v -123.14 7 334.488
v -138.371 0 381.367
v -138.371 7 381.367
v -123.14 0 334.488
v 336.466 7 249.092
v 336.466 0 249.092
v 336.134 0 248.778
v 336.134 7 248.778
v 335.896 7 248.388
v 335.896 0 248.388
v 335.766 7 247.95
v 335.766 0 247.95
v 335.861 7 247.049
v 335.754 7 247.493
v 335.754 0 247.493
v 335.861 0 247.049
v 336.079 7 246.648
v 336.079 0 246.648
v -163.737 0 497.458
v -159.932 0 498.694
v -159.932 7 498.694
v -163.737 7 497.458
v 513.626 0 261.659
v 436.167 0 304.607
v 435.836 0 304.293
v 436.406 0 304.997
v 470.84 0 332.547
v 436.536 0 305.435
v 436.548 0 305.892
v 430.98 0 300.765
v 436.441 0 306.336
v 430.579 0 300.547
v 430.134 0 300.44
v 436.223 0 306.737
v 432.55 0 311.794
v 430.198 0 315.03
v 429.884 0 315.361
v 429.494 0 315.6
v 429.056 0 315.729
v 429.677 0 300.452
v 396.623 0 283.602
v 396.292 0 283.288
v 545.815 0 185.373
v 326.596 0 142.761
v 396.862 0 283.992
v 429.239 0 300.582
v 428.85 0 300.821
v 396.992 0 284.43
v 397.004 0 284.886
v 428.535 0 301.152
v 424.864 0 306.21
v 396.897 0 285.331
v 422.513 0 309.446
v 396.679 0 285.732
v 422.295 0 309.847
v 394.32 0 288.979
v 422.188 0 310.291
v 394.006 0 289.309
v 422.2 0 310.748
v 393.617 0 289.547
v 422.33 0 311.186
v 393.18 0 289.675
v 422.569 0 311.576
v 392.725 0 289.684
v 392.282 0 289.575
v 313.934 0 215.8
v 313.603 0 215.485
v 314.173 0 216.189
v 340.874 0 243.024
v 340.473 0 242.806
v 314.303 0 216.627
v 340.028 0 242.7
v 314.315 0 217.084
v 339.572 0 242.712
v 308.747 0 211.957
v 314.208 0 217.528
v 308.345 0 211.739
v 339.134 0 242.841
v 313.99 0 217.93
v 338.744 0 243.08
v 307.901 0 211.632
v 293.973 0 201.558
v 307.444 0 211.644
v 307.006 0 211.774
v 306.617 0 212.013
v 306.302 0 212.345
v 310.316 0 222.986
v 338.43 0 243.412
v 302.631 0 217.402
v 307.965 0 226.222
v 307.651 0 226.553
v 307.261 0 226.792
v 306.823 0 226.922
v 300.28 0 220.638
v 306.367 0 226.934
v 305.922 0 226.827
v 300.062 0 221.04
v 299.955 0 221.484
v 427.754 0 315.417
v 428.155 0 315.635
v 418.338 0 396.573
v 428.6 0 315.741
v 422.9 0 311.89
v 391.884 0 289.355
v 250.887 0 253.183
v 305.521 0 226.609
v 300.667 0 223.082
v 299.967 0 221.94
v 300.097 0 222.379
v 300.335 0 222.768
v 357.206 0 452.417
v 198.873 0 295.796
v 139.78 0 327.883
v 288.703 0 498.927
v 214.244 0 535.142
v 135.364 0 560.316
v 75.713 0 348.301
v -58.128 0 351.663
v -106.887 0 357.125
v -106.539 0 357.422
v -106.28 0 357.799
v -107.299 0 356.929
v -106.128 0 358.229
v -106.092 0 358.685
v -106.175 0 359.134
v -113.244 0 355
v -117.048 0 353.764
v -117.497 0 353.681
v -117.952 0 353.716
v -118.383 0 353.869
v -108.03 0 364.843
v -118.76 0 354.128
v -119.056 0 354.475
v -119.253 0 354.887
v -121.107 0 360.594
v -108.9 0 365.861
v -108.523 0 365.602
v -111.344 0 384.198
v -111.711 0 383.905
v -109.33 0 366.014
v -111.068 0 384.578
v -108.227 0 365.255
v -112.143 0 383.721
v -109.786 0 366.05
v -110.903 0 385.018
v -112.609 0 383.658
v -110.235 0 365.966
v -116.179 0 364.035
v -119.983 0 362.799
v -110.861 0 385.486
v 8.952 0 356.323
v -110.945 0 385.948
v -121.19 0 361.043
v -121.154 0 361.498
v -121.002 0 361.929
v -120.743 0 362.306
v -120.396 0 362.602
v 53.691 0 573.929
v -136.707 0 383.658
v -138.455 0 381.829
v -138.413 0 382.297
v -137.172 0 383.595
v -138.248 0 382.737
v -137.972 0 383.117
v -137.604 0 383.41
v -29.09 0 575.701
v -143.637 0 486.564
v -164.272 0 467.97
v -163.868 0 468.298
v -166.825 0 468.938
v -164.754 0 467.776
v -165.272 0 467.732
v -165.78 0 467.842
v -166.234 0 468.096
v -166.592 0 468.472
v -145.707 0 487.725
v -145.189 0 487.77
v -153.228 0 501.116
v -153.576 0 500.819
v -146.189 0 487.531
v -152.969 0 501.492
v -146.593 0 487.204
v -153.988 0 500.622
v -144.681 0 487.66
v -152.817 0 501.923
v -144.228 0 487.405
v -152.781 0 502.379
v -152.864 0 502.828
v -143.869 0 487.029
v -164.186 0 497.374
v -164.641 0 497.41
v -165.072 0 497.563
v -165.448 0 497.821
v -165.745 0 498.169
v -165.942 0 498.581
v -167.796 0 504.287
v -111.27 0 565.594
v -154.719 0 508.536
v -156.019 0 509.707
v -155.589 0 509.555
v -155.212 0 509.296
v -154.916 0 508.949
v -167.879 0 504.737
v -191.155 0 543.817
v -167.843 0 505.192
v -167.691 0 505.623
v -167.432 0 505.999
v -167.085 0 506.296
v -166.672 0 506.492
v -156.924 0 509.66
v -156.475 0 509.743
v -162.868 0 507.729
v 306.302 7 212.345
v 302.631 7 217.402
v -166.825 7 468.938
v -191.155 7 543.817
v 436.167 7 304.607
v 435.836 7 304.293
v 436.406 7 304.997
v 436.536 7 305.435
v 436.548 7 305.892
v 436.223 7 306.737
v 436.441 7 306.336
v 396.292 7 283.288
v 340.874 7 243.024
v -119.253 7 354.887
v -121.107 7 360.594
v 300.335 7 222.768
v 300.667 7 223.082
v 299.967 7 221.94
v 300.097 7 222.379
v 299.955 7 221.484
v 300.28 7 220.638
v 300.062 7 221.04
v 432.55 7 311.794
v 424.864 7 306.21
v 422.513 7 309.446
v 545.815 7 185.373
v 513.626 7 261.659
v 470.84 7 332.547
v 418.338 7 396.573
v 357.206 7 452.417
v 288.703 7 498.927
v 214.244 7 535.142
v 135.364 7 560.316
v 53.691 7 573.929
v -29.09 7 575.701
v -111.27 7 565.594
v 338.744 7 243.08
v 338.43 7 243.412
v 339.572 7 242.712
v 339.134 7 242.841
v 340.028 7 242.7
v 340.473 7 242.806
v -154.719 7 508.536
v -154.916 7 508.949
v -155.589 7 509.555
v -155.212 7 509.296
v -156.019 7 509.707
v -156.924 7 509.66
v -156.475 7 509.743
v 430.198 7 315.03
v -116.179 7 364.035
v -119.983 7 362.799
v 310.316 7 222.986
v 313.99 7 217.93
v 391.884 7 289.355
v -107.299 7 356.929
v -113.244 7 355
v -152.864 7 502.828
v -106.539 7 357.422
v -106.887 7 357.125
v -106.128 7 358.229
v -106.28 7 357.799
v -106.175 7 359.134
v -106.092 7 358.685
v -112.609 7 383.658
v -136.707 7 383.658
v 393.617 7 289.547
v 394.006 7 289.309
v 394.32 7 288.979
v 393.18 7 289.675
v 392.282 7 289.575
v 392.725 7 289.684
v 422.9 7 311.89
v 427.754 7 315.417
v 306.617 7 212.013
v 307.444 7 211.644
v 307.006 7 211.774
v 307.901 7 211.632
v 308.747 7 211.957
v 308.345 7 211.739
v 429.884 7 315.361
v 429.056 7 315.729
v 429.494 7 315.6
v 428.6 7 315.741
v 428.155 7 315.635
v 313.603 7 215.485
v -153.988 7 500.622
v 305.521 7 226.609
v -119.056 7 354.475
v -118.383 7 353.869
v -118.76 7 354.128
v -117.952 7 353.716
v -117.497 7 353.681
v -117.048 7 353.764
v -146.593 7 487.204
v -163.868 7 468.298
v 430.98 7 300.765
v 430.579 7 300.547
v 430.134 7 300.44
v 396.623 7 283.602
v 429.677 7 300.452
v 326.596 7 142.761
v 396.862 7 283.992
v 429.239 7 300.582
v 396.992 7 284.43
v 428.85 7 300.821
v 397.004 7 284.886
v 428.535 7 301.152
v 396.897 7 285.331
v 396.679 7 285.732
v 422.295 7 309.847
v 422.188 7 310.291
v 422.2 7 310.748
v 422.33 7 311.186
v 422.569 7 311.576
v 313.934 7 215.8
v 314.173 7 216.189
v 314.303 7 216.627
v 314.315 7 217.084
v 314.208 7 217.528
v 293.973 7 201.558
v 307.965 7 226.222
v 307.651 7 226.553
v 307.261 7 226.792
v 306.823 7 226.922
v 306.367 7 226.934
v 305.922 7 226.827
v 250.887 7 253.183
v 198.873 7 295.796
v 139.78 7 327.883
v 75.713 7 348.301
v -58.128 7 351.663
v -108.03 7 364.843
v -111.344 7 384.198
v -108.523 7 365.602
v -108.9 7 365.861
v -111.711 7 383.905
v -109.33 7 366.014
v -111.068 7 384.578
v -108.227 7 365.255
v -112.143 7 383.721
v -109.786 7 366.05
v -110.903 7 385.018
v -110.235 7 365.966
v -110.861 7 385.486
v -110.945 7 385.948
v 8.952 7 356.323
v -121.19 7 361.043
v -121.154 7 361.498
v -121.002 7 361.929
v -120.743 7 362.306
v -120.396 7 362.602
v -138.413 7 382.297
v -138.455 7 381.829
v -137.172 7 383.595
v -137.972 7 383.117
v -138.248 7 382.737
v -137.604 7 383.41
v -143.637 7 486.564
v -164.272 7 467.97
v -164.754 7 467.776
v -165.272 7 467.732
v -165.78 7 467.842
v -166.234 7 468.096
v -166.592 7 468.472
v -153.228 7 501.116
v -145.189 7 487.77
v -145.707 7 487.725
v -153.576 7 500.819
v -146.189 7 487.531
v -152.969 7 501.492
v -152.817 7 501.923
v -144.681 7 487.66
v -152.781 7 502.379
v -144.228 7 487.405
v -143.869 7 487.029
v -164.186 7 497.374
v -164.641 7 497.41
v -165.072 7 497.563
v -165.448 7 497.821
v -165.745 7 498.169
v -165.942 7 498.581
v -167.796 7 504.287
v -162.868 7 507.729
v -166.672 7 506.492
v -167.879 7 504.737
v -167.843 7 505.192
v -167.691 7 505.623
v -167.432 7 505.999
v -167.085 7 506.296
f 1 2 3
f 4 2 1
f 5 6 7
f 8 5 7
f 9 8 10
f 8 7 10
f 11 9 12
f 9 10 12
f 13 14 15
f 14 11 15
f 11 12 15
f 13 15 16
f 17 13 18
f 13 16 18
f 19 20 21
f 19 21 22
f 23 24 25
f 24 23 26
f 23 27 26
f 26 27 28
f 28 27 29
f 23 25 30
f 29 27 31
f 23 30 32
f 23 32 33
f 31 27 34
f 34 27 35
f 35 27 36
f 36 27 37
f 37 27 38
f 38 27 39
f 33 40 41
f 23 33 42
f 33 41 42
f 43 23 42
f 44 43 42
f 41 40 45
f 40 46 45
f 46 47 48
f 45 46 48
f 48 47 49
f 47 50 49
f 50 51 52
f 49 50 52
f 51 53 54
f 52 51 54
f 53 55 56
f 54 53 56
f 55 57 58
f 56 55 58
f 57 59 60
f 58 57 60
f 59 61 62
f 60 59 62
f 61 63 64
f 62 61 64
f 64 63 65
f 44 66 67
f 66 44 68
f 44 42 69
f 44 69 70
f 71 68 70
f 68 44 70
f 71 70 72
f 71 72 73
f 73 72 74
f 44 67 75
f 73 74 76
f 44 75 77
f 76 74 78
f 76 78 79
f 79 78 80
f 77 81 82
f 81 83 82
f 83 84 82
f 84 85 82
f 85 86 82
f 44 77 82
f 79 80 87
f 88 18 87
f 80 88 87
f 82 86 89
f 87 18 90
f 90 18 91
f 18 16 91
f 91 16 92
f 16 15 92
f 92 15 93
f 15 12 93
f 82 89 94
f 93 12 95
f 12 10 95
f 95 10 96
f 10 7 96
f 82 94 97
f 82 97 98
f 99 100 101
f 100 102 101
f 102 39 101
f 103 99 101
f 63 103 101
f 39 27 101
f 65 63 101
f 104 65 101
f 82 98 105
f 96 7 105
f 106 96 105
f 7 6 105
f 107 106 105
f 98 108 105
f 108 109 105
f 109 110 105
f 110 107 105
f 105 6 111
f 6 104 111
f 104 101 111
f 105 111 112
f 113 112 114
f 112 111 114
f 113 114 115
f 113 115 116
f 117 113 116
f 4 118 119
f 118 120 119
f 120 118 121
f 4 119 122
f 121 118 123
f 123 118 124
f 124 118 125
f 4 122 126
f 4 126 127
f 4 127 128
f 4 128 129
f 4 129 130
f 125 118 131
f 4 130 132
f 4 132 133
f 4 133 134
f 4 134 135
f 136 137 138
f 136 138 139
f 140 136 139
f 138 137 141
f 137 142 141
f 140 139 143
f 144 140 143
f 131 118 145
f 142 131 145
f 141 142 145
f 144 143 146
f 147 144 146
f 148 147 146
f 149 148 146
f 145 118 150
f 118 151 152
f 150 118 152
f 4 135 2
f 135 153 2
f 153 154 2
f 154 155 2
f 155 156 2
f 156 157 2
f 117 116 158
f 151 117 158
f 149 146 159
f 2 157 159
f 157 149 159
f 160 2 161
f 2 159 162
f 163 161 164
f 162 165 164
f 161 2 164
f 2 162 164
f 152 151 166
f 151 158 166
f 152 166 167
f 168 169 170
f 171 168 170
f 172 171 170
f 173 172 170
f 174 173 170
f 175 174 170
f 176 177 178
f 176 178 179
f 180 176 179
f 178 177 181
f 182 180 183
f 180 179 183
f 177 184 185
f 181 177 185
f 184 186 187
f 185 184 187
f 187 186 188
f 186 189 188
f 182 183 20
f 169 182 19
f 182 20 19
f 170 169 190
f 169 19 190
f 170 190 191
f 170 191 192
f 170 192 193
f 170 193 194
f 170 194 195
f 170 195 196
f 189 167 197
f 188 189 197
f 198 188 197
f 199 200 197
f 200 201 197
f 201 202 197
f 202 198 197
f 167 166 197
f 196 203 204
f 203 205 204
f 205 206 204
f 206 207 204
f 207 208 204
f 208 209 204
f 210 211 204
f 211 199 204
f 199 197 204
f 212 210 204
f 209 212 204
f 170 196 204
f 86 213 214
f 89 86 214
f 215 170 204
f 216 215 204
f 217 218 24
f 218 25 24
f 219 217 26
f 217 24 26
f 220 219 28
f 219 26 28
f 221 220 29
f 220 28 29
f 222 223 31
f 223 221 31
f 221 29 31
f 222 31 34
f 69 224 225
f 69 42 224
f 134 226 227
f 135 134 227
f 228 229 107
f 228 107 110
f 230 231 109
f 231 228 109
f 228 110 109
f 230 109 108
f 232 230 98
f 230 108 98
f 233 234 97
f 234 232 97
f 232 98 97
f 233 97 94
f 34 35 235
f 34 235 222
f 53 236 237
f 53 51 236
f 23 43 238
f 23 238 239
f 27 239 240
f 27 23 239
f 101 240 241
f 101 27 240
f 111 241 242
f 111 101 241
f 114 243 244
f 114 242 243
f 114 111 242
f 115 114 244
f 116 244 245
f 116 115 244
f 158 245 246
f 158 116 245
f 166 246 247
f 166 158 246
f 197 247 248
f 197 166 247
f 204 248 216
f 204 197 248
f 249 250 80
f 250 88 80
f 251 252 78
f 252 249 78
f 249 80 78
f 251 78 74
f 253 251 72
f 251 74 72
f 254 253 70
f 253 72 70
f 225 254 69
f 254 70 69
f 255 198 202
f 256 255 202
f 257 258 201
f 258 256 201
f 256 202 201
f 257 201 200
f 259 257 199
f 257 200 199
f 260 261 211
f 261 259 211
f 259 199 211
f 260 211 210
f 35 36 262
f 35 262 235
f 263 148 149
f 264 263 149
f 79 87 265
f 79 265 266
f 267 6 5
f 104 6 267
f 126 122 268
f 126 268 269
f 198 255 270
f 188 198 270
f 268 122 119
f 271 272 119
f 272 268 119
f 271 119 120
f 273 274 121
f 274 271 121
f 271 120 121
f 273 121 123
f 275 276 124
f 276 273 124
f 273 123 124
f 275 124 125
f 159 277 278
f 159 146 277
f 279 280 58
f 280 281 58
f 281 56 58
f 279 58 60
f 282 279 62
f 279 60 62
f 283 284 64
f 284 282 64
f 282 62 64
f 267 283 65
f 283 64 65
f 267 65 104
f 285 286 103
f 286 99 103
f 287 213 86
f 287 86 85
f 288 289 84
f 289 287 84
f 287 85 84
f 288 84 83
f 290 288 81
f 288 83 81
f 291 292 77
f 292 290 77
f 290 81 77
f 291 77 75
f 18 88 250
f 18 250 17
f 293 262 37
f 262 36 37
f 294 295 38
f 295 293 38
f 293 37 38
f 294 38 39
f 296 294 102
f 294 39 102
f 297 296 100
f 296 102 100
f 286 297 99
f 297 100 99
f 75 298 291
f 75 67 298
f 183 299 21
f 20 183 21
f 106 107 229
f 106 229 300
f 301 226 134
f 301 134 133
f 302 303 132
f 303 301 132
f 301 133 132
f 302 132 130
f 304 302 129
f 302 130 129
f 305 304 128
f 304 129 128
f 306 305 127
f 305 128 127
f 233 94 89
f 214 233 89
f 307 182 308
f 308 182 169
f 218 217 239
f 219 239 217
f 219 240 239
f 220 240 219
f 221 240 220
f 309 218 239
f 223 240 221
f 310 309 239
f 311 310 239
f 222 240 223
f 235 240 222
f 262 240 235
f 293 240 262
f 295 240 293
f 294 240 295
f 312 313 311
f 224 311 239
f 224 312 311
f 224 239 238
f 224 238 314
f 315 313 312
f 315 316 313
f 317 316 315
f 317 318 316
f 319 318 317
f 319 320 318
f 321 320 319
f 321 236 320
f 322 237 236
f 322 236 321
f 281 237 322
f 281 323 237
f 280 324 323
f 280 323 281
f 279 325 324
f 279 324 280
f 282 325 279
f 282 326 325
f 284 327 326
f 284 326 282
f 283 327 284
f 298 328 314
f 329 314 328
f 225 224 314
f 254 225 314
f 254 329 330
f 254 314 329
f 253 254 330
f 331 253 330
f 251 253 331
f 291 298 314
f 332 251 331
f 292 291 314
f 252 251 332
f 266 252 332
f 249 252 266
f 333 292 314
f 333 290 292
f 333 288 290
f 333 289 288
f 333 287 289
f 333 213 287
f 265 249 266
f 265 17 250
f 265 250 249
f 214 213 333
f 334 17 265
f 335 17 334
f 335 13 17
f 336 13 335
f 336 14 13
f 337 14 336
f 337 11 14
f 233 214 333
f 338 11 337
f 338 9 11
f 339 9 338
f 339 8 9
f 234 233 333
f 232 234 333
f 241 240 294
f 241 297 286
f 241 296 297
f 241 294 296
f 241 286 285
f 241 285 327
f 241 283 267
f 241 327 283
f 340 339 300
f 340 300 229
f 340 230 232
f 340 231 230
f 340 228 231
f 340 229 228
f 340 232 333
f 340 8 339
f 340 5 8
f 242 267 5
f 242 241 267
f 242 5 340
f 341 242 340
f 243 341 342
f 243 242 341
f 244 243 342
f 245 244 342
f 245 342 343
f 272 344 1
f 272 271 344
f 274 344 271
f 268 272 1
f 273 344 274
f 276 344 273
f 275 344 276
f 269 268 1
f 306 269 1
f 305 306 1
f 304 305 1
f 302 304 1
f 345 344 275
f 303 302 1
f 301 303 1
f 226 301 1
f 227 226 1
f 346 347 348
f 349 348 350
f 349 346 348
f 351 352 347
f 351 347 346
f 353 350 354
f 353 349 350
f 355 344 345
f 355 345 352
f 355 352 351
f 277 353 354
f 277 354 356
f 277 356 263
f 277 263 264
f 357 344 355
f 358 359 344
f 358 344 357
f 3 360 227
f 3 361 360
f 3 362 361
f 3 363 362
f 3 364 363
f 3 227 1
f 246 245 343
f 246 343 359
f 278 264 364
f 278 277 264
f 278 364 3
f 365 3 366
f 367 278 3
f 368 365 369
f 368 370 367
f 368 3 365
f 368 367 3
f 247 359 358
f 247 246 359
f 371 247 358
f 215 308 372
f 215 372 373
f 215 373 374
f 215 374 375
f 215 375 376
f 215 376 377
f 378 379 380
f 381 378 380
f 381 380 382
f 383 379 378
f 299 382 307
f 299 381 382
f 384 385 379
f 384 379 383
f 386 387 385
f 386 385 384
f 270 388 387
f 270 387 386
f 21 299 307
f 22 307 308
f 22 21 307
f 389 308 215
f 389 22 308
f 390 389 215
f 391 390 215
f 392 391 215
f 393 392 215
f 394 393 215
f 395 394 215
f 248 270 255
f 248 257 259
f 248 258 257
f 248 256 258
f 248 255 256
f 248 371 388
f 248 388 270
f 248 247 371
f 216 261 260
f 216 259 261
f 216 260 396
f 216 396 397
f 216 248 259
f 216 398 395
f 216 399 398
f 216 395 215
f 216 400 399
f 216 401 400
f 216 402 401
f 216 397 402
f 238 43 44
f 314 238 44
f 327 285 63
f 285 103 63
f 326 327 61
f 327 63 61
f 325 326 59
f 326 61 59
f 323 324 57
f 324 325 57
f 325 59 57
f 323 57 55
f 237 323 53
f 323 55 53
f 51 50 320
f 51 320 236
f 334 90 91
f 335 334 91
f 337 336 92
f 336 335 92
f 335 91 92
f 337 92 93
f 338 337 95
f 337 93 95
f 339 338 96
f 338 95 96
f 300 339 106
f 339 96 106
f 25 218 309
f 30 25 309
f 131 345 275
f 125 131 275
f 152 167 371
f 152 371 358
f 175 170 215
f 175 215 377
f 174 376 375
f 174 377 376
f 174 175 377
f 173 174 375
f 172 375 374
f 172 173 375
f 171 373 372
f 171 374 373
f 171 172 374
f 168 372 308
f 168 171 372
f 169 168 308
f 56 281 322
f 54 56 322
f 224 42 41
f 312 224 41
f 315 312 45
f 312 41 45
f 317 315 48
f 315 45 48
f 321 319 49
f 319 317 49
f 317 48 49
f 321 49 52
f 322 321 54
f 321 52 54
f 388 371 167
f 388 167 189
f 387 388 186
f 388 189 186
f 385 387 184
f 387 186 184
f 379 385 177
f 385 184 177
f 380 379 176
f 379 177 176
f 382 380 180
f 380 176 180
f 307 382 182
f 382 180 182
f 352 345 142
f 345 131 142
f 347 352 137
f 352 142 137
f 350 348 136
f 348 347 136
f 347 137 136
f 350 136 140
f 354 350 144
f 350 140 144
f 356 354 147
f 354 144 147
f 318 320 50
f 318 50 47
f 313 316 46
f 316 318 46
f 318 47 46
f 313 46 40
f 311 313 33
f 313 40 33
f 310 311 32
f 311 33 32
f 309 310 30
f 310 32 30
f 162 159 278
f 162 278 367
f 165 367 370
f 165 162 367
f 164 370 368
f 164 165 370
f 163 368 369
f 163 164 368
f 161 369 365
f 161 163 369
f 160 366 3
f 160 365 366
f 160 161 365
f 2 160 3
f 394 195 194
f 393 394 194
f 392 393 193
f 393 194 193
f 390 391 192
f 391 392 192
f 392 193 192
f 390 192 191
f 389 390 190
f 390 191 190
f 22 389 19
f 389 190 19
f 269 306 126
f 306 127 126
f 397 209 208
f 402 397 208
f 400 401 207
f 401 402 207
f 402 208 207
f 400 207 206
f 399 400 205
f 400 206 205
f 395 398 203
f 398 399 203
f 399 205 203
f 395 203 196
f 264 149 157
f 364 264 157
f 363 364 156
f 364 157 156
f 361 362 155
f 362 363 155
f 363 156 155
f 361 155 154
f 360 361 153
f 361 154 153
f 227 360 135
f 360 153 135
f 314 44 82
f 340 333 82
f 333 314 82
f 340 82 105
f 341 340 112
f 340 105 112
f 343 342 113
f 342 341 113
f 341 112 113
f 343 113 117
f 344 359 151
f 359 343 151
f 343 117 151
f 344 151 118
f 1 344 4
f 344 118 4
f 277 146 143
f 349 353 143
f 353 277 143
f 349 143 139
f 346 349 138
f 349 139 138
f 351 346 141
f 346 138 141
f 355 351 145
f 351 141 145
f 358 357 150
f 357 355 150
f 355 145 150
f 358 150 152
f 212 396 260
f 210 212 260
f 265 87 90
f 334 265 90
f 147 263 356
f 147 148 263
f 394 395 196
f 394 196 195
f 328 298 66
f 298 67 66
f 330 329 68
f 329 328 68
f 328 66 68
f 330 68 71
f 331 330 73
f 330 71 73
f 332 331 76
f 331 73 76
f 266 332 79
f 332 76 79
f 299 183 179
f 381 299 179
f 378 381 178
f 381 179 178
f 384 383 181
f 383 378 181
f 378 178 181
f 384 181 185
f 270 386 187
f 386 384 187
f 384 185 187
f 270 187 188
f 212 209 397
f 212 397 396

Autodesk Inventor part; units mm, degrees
ref_plane "YZ Plane" through (0, 0, 0) normal (1, 0, 0) x (0, 1, 0)
ref_plane "XZ Plane" through (0, 0, 0) normal (0, 1, 0) x (-1, 0, 0)
ref_plane "XY Plane" through (0, 0, 0) normal (0, 0, 1) x (1, 0, 0)
sketch "Sketch1" plane through (0, 0, 0) normal (0, 1, 0) x (-1, 0, 0)
  line L0 (-545.8153, 185.3726) -> (-326.5965, 142.7608)
  line L1 (-545.8153, -185.3726) -> (-326.5965, -142.7608)
  arc A0 (-545.8153, -185.3726) -> (-545.8153, 185.3726) centre (0, 0) ccw
  arc A1 (374.3691, 3.75) -> (372.6191, 2) centre (374.3691, 2) ccw
  arc A2 (372.6191, -2) -> (374.3691, -3.75) centre (374.3691, -2) ccw
  line L2 (380.3691, 3.75) -> (374.3691, 3.75)
  line L3 (374.3691, -3.75) -> (380.3691, -3.75)
  line L4 (382.1191, 2) -> (382.1191, -2)
  arc A3 (380.3691, -3.75) -> (382.1191, -2) centre (380.3691, -2) ccw
  arc A4 (382.1191, 2) -> (380.3691, 3.75) centre (380.3691, 2) ccw
  line L5 (372.6191, -2) -> (372.6191, 2)
  line L6 (523.7076, 2) -> (523.7076, -2)
  arc A5 (523.7076, -2) -> (525.4576, -3.75) centre (525.4576, -2) ccw
  arc A6 (525.4576, 3.75) -> (523.7076, 2) centre (525.4576, 2) ccw
  line L7 (531.4576, -3.75) -> (525.4576, -3.75)
  line L8 (525.4576, 3.75) -> (531.4576, 3.75)
  arc A7 (531.4576, -3.75) -> (533.2076, -2) centre (531.4576, -2) ccw
  line L9 (533.2076, -2) -> (533.2076, 2)
  arc A8 (533.2076, 2) -> (531.4576, 3.75) centre (531.4576, 2) ccw
  arc A9 (-326.5965, -142.7608) -> (-326.5965, 142.7608) centre (0, 0) ccw
  line L10 (116.1792, 364.0349) -> (119.9834, 362.7989)
  arc A10 (121.107, 360.5937) -> (119.9834, 362.7989) centre (119.4426, 361.1345) ccw
  arc A11 (116.1792, 364.0349) -> (113.9741, 362.9114) centre (115.6384, 362.3706) ccw
  line L11 (119.2529, 354.8874) -> (121.107, 360.5937)
  line L12 (113.9741, 362.9114) -> (112.12, 357.205)
  line L13 (117.0478, 353.7638) -> (113.2435, 354.9999)
  arc A12 (112.12, 357.205) -> (113.2435, 354.9999) centre (113.7843, 356.6642) ccw
  arc A13 (117.0478, 353.7638) -> (119.2529, 354.8874) centre (117.5885, 355.4282) ccw
  arc A14 (163.7367, 497.4575) -> (165.9418, 498.5811) centre (164.2774, 499.1218) ccw
  arc A15 (158.8089, 500.8987) -> (159.9324, 498.6936) centre (160.4732, 500.3579) ccw
  line L14 (159.9324, 498.6936) -> (163.7367, 497.4575)
  line L15 (158.8089, 500.8987) -> (160.663, 506.605)
  line L16 (167.7959, 504.2874) -> (165.9418, 498.5811)
  arc A16 (162.8681, 507.7286) -> (160.663, 506.605) centre (162.3273, 506.0642) ccw
  line L17 (166.6723, 506.4925) -> (162.8681, 507.7286)
  arc A17 (167.7959, 504.2874) -> (166.6723, 506.4925) centre (166.1315, 504.8282) ccw
  line L18 (-310.3164, 222.986) -> (-307.9653, 226.222)
  arc A18 (-305.5209, 226.6092) -> (-307.9653, 226.222) centre (-306.5495, 225.1934) ccw
  arc A19 (-310.3164, 222.986) -> (-309.9293, 220.5416) centre (-308.9007, 221.9573) ccw
  line L19 (-300.6668, 223.0825) -> (-305.5209, 226.6092)
  line L20 (-309.9293, 220.5416) -> (-305.0752, 217.0148)
  line L21 (-300.2796, 220.6381) -> (-302.6308, 217.402)
  arc A20 (-305.0752, 217.0148) -> (-302.6308, 217.402) centre (-304.0466, 218.4306) ccw
  arc A21 (-300.2796, 220.6381) -> (-300.6668, 223.0825) centre (-301.6954, 221.6667) ccw
  arc A22 (-422.5128, 309.4456) -> (-422.8999, 311.89) centre (-423.9286, 310.4743) ccw
  arc A23 (-427.3083, 305.8224) -> (-424.8639, 306.2096) centre (-426.2797, 307.2382) ccw
  line L22 (-424.8639, 306.2096) -> (-422.5128, 309.4456)
  line L23 (-427.3083, 305.8224) -> (-432.1624, 309.3491)
  line L24 (-427.754, 315.4167) -> (-422.8999, 311.89)
  arc A24 (-432.5496, 311.7935) -> (-432.1624, 309.3491) centre (-431.1338, 310.7649) ccw
  line L25 (-430.1984, 315.0296) -> (-432.5496, 311.7935)
  arc A25 (-427.754, 315.4167) -> (-430.1984, 315.0296) centre (-428.7827, 314.001) ccw
  line L26 (-307.9653, -226.222) -> (-310.3164, -222.986)
  arc A26 (-309.9293, -220.5416) -> (-310.3164, -222.986) centre (-308.9007, -221.9573) ccw
  arc A27 (-307.9653, -226.222) -> (-305.5209, -226.6092) centre (-306.5495, -225.1934) ccw
  line L27 (-305.0752, -217.0148) -> (-309.9293, -220.5416)
  line L28 (-305.5209, -226.6092) -> (-300.6668, -223.0825)
  line L29 (-302.6308, -217.402) -> (-300.2796, -220.6381)
  arc A28 (-300.6668, -223.0825) -> (-300.2796, -220.6381) centre (-301.6954, -221.6667) ccw
  arc A29 (-302.6308, -217.402) -> (-305.0752, -217.0148) centre (-304.0466, -218.4306) ccw
  arc A30 (-424.8639, -306.2096) -> (-427.3083, -305.8224) centre (-426.2797, -307.2382) ccw
  arc A31 (-422.8999, -311.89) -> (-422.5128, -309.4456) centre (-423.9286, -310.4743) ccw
  line L30 (-422.5128, -309.4456) -> (-424.8639, -306.2096)
  line L31 (-422.8999, -311.89) -> (-427.754, -315.4167)
  line L32 (-432.1624, -309.3491) -> (-427.3083, -305.8224)
  arc A32 (-430.1984, -315.0296) -> (-427.754, -315.4167) centre (-428.7827, -314.001) ccw
  line L33 (-432.5496, -311.7935) -> (-430.1984, -315.0296)
  arc A33 (-432.1624, -309.3491) -> (-432.5496, -311.7935) centre (-431.1338, -310.7649) ccw
  line L34 (119.9834, -362.7989) -> (116.1792, -364.0349)
  arc A34 (113.9741, -362.9114) -> (116.1792, -364.0349) centre (115.6384, -362.3706) ccw
  arc A35 (119.9834, -362.7989) -> (121.107, -360.5937) centre (119.4426, -361.1345) ccw
  line L35 (112.12, -357.205) -> (113.9741, -362.9114)
  line L36 (121.107, -360.5937) -> (119.2529, -354.8874)
  line L37 (113.2435, -354.9999) -> (117.0478, -353.7638)
  arc A36 (119.2529, -354.8874) -> (117.0478, -353.7638) centre (117.5885, -355.4282) ccw
  arc A37 (113.2435, -354.9999) -> (112.12, -357.205) centre (113.7843, -356.6642) ccw
  arc A38 (159.9324, -498.6936) -> (158.8089, -500.8987) centre (160.4732, -500.3579) ccw
  arc A39 (165.9418, -498.5811) -> (163.7367, -497.4575) centre (164.2774, -499.1218) ccw
  line L38 (163.7367, -497.4575) -> (159.9324, -498.6936)
  line L39 (165.9418, -498.5811) -> (167.7959, -504.2874)
  line L40 (160.663, -506.605) -> (158.8089, -500.8987)
  arc A40 (166.6723, -506.4925) -> (167.7959, -504.2874) centre (166.1315, -504.8282) ccw
  line L41 (162.8681, -507.7286) -> (166.6723, -506.4925)
  arc A41 (160.663, -506.605) -> (162.8681, -507.7286) centre (162.3273, -506.0642) ccw
  line L42 (225.4462, 74.1184) -> (211.8442, 74.1184)
  line L43 (225.4462, 74.1184) -> (225.4462, 49.1184)
  arc A42 (405.4604, -13.75) -> (407.1248, -11.4592) centre (405.4604, -12) ccw
  arc A43 (496.0158, -11.1361) -> (497.5378, -13.75) centre (497.5378, -12) ccw
  line L44 (508.6578, 11.1361) -> (496.0158, -11.1361)
  arc A44 (508.6578, 11.1361) -> (507.1359, 13.75) centre (507.1359, 12) ccw
  arc A45 (416.8691, -2) -> (418.6191, -3.75) centre (418.6191, -2) ccw
  line L45 (399.6781, 11.4592) -> (407.1248, -11.4592)
  line L46 (416.8691, 2) -> (416.8691, -2)
  arc A46 (401.3425, 13.75) -> (399.6781, 11.4592) centre (401.3425, 12) ccw
  arc A47 (418.6191, 3.75) -> (416.8691, 2) centre (418.6191, 2) ccw
  line L47 (507.1359, 13.75) -> (401.3425, 13.75)
  line L48 (418.6191, -3.75) -> (487.1191, -3.75)
  line L49 (487.1191, 3.75) -> (418.6191, 3.75)
  arc A48 (487.1191, -3.75) -> (488.8691, -2.0136) centre (487.1326, -2.0136) ccw
  line L50 (488.8691, -2.0136) -> (488.8691, 2)
  arc A49 (488.8691, 2) -> (487.1191, 3.75) centre (487.1191, 2) ccw
  line L51 (405.4604, -13.75) -> (356.1697, -13.75)
  line L52 (497.5378, -13.75) -> (576.271, -13.75)
  arc A50 (163.8684, 468.2978) -> (166.8247, 468.9375) centre (165.1603, 469.4783) ccw
  line L53 (146.5928, 487.2036) -> (163.8684, 468.2978)
  arc A51 (146.5928, 487.2036) -> (143.6366, 486.5639) centre (145.3009, 486.0231) ccw
  line L54 (152.9839, 464.32) -> (149.1668, 465.5602)
  arc A52 (154.0946, 462.119) -> (152.9839, 464.32) centre (152.4473, 462.6685) ccw
  arc A53 (149.1668, 465.5602) -> (146.9616, 464.4366) centre (148.626, 463.8959) ccw
  arc A54 (110.9446, 385.9484) -> (112.609, 383.6576) centre (112.609, 385.4076) ccw
  arc A55 (138.3712, 381.3668) -> (136.7068, 383.6576) centre (136.7068, 381.9076) ccw
  line L55 (112.609, 383.6576) -> (136.7068, 383.6576)
  line L56 (126.9175, 397.0841) -> (130.7218, 395.8481)
  arc A56 (125.794, 399.2893) -> (126.9175, 397.0841) centre (127.4583, 398.7485) ccw
  line L57 (143.6366, 486.5639) -> (110.9446, 385.9484)
  line L58 (146.9616, 464.4366) -> (125.794, 399.2893)
  line L59 (132.9269, 396.9716) -> (154.0946, 462.119)
  arc A57 (130.7218, 395.8481) -> (132.9269, 396.9716) centre (131.2625, 397.5124) ccw
  line L60 (138.3712, 381.3668) -> (123.1395, 334.4885)
  line L61 (166.8247, 468.9375) -> (191.1546, 543.8173)
  line L62 (-394.3199, 288.9791) -> (-396.679, 285.732)
  arc A58 (-391.8835, 289.3553) -> (-394.3199, 288.9791) centre (-392.915, 287.9584) ccw
  arc A59 (-396.679, 285.732) -> (-396.2919, 283.2876) centre (-395.2632, 284.7034) ccw
  line L63 (-338.4298, 243.4115) -> (-336.0786, 246.6476)
  arc A60 (-340.8742, 243.0243) -> (-338.4298, 243.4115) centre (-339.8456, 244.4401) ccw
  line L64 (-396.2919, 283.2876) -> (-340.8742, 243.0243)
  line L65 (-336.4658, 249.092) -> (-391.8835, 289.3553)
  arc A61 (-336.0786, 246.6476) -> (-336.4658, 249.092) centre (-337.4944, 247.6762) ccw
  line L66 (-396.687, -285.7211) -> (-394.3279, -288.9681)
  arc A62 (-396.2919, -283.2876) -> (-396.687, -285.7211) centre (-395.2821, -284.7004) ccw
  arc A63 (-394.3279, -288.9681) -> (-391.8835, -289.3553) centre (-392.9121, -287.9395) ccw
  line L67 (-336.0786, -246.6476) -> (-338.4298, -243.4115)
  arc A64 (-336.4658, -249.092) -> (-336.0786, -246.6476) centre (-337.4944, -247.6762) ccw
  line L68 (-391.8835, -289.3553) -> (-336.4658, -249.092)
  line L69 (-340.8742, -243.0243) -> (-396.2919, -283.2876)
  arc A65 (-338.4298, -243.4115) -> (-340.8742, -243.0243) centre (-339.8456, -244.4401) ccw
  arc A66 (142.6862, -475.1804) -> (140.6706, -477.4355) centre (142.3349, -476.8947) ccw
  line L70 (167.775, -480.3211) -> (142.6862, -475.1804)
  arc A67 (167.775, -480.3211) -> (169.7906, -478.0659) centre (168.1263, -478.6067) ccw
  line L71 (149.1539, -465.5644) -> (152.971, -464.3241)
  arc A68 (146.9616, -464.4366) -> (149.1539, -465.5644) centre (148.6173, -463.9129) ccw
  arc A69 (152.971, -464.3241) -> (154.0946, -462.119) centre (152.4302, -462.6598) ccw
  arc A70 (137.0987, -377.4504) -> (134.4057, -376.5754) centre (135.4343, -377.9912) ccw
  arc A71 (112.2171, -389.8648) -> (114.9101, -390.7398) centre (113.8815, -389.324) ccw
  line L72 (134.4057, -376.5754) -> (114.9101, -390.7398)
  line L73 (130.7218, -395.8481) -> (126.9175, -397.0841)
  arc A72 (132.9269, -396.9716) -> (130.7218, -395.8481) centre (131.2625, -397.5124) ccw
  line L74 (169.7906, -478.0659) -> (137.0987, -377.4504)
  line L75 (154.0946, -462.119) -> (132.9269, -396.9716)
  line L76 (125.794, -399.2893) -> (146.9616, -464.4366)
  arc A73 (126.9175, -397.0841) -> (125.794, -399.2893) centre (127.4583, -398.7485) ccw
  line L77 (112.2171, -389.8648) -> (96.9855, -342.9865)
  line L78 (140.6706, -477.4355) -> (165.0005, -552.3153)
  line L79 (-432.5496, 311.7935) -> (-436.2232, 306.7372)
  line L80 (-435.8361, 304.2928) -> (-430.9801, 300.7647)
  line L81 (-428.5353, 301.1524) -> (-424.8639, 306.2096)
  arc A74 (-436.2232, 306.7372) -> (-435.8361, 304.2928) centre (-434.8075, 305.7085) ccw
  arc A75 (-430.9801, 300.7647) -> (-428.5353, 301.1524) centre (-429.9515, 302.1805) ccw
  line L82 (-310.3164, 222.986) -> (-313.9901, 217.9296)
  line L83 (-313.603, 215.4852) -> (-308.7469, 211.9571)
  line L84 (-306.3022, 212.3448) -> (-302.6308, 217.402)
  arc A76 (-313.9901, 217.9296) -> (-313.603, 215.4852) centre (-312.5743, 216.901) ccw
  arc A77 (-308.7469, 211.9571) -> (-306.3022, 212.3448) centre (-307.7183, 213.3729) ccw
  line L85 (-430.1984, -315.0296) -> (-426.5248, -320.086)
  arc A78 (-426.5248, -320.086) -> (-424.0804, -320.4731) centre (-425.109, -319.0573) ccw
  line L86 (-424.0804, -320.4731) -> (-419.2244, -316.945)
  arc A79 (-419.2244, -316.945) -> (-418.8376, -314.5001) centre (-420.253, -315.5292) ccw
  line L87 (-418.8376, -314.5001) -> (-422.5128, -309.4456)
  line L88 (-307.9653, -226.222) -> (-304.2917, -231.2784)
  arc A80 (-304.2917, -231.2784) -> (-301.8472, -231.6655) centre (-302.8759, -230.2498) ccw
  line L89 (-301.8472, -231.6655) -> (-296.9912, -228.1374)
  line L90 (-296.6045, -225.6925) -> (-300.2796, -220.6381)
  arc A81 (-296.9912, -228.1374) -> (-296.6045, -225.6925) centre (-298.0199, -226.7217) ccw
  line L91 (166.6723, -506.4925) -> (172.6164, -504.5612)
  arc A82 (172.6164, -504.5612) -> (173.74, -502.356) centre (172.0756, -502.8968) ccw
  line L92 (173.74, -502.356) -> (171.8852, -496.6475)
  arc A83 (171.8852, -496.6475) -> (169.6794, -495.5241) centre (170.2208, -497.1882) ccw
  line L93 (169.6794, -495.5241) -> (163.7367, -497.4575)
  line L94 (119.9834, -362.7989) -> (125.9275, -360.8675)
  arc A84 (125.9275, -360.8675) -> (127.0511, -358.6624) centre (125.3867, -359.2032) ccw
  line L95 (127.0511, -358.6624) -> (125.1963, -352.9538)
  line L96 (122.9905, -351.8304) -> (117.0478, -353.7638)
  arc A85 (125.1963, -352.9538) -> (122.9905, -351.8304) centre (123.5319, -353.4946) ccw
  line L97 (533.2076, 2) -> (533.2076, 8.25)
  arc A86 (533.2076, 8.25) -> (531.4576, 10) centre (531.4576, 8.25) ccw
  line L98 (531.4576, 10) -> (525.4552, 10)
  arc A87 (525.4552, 10) -> (523.7052, 8.2493) centre (525.4552, 8.25) ccw
  line L99 (523.7052, 8.2493) -> (523.7076, 2)
  line L100 (382.1191, 2) -> (382.1191, 8.25)
  arc A88 (382.1191, 8.25) -> (380.3691, 10) centre (380.3691, 8.25) ccw
  line L101 (380.3691, 10) -> (374.3668, 10)
  line L102 (372.6168, 8.2493) -> (372.6191, 2)
  arc A89 (374.3668, 10) -> (372.6168, 8.2493) centre (374.3668, 8.25) ccw
  line L103 (162.8681, 507.7286) -> (156.924, 509.6599)
  arc A90 (156.924, 509.6599) -> (154.7189, 508.5364) centre (156.3832, 507.9956) ccw
  line L104 (154.7189, 508.5364) -> (152.864, 502.8278)
  arc A91 (152.864, 502.8278) -> (153.9882, 500.6225) centre (154.5284, 502.287) ccw
  line L105 (153.9882, 500.6225) -> (159.9324, 498.6936)
  line L106 (116.1792, 364.0349) -> (110.2351, 365.9663)
  arc A92 (110.2351, 365.9663) -> (108.03, 364.8427) centre (109.6943, 364.3019) ccw
  line L107 (108.03, 364.8427) -> (106.1751, 359.1341)
  line L108 (107.2993, 356.9288) -> (113.2435, 354.9999)
  arc A93 (106.1751, 359.1341) -> (107.2993, 356.9288) centre (107.8395, 358.5934) ccw
  point P0 (494.5322, -13.75)
  point P1 (417.3817, -3.2374)
  point P2 (417.3817, 3.2374)
  point P3 (488.3566, 3.2374)
  point P4 (165.8959, 466.0791)
  point P5 (147.8315, 465.4551)
  point P6 (125.8991, 397.954)
  point P7 (132.057, 395.9532)
  point P8 (-396.9917, 284.4297)
  point P9 (-339.5718, 242.7117)
  point P10 (-335.766, 247.95)
  point P11 (-393.1859, -289.6679)
  point P12 (-335.766, -247.95)
  point P13 (-339.5718, -242.7117)
  point P14 (139.7418, -474.577)
  point P15 (153.9895, -463.4543)
  point P16 (132.057, -395.9532)
  point P17 (125.8991, -397.954)
  point P18 (-302.6308, 217.402)
  point P19 (113.2435, 354.9999)
  dimension "d34" = 1152.87
  dimension "d45" = 7.5
  dimension "d48" = 712.87
  dimension "d60" = 360
  dimension "d62" = 13.602
  dimension "d63" = 25
  dimension "d72" = 7.5
  dimension "d74" = 3.5
  dimension "d75" = 3.5
  dimension "d79" = 0
  dimension "d80" = 8
  dimension "d81" = 1.75
  dimension "d84" = 8
  dimension "d85" = 1.75
  dimension "d88" = 360
extrude "Extrusion1" add sketch "Sketch1" along normal blind 7 contours A0 L61 A50 L53 A51 L57 A54 L55 A55 L60 A9 L0
properties part number "Level 2a - V2"
